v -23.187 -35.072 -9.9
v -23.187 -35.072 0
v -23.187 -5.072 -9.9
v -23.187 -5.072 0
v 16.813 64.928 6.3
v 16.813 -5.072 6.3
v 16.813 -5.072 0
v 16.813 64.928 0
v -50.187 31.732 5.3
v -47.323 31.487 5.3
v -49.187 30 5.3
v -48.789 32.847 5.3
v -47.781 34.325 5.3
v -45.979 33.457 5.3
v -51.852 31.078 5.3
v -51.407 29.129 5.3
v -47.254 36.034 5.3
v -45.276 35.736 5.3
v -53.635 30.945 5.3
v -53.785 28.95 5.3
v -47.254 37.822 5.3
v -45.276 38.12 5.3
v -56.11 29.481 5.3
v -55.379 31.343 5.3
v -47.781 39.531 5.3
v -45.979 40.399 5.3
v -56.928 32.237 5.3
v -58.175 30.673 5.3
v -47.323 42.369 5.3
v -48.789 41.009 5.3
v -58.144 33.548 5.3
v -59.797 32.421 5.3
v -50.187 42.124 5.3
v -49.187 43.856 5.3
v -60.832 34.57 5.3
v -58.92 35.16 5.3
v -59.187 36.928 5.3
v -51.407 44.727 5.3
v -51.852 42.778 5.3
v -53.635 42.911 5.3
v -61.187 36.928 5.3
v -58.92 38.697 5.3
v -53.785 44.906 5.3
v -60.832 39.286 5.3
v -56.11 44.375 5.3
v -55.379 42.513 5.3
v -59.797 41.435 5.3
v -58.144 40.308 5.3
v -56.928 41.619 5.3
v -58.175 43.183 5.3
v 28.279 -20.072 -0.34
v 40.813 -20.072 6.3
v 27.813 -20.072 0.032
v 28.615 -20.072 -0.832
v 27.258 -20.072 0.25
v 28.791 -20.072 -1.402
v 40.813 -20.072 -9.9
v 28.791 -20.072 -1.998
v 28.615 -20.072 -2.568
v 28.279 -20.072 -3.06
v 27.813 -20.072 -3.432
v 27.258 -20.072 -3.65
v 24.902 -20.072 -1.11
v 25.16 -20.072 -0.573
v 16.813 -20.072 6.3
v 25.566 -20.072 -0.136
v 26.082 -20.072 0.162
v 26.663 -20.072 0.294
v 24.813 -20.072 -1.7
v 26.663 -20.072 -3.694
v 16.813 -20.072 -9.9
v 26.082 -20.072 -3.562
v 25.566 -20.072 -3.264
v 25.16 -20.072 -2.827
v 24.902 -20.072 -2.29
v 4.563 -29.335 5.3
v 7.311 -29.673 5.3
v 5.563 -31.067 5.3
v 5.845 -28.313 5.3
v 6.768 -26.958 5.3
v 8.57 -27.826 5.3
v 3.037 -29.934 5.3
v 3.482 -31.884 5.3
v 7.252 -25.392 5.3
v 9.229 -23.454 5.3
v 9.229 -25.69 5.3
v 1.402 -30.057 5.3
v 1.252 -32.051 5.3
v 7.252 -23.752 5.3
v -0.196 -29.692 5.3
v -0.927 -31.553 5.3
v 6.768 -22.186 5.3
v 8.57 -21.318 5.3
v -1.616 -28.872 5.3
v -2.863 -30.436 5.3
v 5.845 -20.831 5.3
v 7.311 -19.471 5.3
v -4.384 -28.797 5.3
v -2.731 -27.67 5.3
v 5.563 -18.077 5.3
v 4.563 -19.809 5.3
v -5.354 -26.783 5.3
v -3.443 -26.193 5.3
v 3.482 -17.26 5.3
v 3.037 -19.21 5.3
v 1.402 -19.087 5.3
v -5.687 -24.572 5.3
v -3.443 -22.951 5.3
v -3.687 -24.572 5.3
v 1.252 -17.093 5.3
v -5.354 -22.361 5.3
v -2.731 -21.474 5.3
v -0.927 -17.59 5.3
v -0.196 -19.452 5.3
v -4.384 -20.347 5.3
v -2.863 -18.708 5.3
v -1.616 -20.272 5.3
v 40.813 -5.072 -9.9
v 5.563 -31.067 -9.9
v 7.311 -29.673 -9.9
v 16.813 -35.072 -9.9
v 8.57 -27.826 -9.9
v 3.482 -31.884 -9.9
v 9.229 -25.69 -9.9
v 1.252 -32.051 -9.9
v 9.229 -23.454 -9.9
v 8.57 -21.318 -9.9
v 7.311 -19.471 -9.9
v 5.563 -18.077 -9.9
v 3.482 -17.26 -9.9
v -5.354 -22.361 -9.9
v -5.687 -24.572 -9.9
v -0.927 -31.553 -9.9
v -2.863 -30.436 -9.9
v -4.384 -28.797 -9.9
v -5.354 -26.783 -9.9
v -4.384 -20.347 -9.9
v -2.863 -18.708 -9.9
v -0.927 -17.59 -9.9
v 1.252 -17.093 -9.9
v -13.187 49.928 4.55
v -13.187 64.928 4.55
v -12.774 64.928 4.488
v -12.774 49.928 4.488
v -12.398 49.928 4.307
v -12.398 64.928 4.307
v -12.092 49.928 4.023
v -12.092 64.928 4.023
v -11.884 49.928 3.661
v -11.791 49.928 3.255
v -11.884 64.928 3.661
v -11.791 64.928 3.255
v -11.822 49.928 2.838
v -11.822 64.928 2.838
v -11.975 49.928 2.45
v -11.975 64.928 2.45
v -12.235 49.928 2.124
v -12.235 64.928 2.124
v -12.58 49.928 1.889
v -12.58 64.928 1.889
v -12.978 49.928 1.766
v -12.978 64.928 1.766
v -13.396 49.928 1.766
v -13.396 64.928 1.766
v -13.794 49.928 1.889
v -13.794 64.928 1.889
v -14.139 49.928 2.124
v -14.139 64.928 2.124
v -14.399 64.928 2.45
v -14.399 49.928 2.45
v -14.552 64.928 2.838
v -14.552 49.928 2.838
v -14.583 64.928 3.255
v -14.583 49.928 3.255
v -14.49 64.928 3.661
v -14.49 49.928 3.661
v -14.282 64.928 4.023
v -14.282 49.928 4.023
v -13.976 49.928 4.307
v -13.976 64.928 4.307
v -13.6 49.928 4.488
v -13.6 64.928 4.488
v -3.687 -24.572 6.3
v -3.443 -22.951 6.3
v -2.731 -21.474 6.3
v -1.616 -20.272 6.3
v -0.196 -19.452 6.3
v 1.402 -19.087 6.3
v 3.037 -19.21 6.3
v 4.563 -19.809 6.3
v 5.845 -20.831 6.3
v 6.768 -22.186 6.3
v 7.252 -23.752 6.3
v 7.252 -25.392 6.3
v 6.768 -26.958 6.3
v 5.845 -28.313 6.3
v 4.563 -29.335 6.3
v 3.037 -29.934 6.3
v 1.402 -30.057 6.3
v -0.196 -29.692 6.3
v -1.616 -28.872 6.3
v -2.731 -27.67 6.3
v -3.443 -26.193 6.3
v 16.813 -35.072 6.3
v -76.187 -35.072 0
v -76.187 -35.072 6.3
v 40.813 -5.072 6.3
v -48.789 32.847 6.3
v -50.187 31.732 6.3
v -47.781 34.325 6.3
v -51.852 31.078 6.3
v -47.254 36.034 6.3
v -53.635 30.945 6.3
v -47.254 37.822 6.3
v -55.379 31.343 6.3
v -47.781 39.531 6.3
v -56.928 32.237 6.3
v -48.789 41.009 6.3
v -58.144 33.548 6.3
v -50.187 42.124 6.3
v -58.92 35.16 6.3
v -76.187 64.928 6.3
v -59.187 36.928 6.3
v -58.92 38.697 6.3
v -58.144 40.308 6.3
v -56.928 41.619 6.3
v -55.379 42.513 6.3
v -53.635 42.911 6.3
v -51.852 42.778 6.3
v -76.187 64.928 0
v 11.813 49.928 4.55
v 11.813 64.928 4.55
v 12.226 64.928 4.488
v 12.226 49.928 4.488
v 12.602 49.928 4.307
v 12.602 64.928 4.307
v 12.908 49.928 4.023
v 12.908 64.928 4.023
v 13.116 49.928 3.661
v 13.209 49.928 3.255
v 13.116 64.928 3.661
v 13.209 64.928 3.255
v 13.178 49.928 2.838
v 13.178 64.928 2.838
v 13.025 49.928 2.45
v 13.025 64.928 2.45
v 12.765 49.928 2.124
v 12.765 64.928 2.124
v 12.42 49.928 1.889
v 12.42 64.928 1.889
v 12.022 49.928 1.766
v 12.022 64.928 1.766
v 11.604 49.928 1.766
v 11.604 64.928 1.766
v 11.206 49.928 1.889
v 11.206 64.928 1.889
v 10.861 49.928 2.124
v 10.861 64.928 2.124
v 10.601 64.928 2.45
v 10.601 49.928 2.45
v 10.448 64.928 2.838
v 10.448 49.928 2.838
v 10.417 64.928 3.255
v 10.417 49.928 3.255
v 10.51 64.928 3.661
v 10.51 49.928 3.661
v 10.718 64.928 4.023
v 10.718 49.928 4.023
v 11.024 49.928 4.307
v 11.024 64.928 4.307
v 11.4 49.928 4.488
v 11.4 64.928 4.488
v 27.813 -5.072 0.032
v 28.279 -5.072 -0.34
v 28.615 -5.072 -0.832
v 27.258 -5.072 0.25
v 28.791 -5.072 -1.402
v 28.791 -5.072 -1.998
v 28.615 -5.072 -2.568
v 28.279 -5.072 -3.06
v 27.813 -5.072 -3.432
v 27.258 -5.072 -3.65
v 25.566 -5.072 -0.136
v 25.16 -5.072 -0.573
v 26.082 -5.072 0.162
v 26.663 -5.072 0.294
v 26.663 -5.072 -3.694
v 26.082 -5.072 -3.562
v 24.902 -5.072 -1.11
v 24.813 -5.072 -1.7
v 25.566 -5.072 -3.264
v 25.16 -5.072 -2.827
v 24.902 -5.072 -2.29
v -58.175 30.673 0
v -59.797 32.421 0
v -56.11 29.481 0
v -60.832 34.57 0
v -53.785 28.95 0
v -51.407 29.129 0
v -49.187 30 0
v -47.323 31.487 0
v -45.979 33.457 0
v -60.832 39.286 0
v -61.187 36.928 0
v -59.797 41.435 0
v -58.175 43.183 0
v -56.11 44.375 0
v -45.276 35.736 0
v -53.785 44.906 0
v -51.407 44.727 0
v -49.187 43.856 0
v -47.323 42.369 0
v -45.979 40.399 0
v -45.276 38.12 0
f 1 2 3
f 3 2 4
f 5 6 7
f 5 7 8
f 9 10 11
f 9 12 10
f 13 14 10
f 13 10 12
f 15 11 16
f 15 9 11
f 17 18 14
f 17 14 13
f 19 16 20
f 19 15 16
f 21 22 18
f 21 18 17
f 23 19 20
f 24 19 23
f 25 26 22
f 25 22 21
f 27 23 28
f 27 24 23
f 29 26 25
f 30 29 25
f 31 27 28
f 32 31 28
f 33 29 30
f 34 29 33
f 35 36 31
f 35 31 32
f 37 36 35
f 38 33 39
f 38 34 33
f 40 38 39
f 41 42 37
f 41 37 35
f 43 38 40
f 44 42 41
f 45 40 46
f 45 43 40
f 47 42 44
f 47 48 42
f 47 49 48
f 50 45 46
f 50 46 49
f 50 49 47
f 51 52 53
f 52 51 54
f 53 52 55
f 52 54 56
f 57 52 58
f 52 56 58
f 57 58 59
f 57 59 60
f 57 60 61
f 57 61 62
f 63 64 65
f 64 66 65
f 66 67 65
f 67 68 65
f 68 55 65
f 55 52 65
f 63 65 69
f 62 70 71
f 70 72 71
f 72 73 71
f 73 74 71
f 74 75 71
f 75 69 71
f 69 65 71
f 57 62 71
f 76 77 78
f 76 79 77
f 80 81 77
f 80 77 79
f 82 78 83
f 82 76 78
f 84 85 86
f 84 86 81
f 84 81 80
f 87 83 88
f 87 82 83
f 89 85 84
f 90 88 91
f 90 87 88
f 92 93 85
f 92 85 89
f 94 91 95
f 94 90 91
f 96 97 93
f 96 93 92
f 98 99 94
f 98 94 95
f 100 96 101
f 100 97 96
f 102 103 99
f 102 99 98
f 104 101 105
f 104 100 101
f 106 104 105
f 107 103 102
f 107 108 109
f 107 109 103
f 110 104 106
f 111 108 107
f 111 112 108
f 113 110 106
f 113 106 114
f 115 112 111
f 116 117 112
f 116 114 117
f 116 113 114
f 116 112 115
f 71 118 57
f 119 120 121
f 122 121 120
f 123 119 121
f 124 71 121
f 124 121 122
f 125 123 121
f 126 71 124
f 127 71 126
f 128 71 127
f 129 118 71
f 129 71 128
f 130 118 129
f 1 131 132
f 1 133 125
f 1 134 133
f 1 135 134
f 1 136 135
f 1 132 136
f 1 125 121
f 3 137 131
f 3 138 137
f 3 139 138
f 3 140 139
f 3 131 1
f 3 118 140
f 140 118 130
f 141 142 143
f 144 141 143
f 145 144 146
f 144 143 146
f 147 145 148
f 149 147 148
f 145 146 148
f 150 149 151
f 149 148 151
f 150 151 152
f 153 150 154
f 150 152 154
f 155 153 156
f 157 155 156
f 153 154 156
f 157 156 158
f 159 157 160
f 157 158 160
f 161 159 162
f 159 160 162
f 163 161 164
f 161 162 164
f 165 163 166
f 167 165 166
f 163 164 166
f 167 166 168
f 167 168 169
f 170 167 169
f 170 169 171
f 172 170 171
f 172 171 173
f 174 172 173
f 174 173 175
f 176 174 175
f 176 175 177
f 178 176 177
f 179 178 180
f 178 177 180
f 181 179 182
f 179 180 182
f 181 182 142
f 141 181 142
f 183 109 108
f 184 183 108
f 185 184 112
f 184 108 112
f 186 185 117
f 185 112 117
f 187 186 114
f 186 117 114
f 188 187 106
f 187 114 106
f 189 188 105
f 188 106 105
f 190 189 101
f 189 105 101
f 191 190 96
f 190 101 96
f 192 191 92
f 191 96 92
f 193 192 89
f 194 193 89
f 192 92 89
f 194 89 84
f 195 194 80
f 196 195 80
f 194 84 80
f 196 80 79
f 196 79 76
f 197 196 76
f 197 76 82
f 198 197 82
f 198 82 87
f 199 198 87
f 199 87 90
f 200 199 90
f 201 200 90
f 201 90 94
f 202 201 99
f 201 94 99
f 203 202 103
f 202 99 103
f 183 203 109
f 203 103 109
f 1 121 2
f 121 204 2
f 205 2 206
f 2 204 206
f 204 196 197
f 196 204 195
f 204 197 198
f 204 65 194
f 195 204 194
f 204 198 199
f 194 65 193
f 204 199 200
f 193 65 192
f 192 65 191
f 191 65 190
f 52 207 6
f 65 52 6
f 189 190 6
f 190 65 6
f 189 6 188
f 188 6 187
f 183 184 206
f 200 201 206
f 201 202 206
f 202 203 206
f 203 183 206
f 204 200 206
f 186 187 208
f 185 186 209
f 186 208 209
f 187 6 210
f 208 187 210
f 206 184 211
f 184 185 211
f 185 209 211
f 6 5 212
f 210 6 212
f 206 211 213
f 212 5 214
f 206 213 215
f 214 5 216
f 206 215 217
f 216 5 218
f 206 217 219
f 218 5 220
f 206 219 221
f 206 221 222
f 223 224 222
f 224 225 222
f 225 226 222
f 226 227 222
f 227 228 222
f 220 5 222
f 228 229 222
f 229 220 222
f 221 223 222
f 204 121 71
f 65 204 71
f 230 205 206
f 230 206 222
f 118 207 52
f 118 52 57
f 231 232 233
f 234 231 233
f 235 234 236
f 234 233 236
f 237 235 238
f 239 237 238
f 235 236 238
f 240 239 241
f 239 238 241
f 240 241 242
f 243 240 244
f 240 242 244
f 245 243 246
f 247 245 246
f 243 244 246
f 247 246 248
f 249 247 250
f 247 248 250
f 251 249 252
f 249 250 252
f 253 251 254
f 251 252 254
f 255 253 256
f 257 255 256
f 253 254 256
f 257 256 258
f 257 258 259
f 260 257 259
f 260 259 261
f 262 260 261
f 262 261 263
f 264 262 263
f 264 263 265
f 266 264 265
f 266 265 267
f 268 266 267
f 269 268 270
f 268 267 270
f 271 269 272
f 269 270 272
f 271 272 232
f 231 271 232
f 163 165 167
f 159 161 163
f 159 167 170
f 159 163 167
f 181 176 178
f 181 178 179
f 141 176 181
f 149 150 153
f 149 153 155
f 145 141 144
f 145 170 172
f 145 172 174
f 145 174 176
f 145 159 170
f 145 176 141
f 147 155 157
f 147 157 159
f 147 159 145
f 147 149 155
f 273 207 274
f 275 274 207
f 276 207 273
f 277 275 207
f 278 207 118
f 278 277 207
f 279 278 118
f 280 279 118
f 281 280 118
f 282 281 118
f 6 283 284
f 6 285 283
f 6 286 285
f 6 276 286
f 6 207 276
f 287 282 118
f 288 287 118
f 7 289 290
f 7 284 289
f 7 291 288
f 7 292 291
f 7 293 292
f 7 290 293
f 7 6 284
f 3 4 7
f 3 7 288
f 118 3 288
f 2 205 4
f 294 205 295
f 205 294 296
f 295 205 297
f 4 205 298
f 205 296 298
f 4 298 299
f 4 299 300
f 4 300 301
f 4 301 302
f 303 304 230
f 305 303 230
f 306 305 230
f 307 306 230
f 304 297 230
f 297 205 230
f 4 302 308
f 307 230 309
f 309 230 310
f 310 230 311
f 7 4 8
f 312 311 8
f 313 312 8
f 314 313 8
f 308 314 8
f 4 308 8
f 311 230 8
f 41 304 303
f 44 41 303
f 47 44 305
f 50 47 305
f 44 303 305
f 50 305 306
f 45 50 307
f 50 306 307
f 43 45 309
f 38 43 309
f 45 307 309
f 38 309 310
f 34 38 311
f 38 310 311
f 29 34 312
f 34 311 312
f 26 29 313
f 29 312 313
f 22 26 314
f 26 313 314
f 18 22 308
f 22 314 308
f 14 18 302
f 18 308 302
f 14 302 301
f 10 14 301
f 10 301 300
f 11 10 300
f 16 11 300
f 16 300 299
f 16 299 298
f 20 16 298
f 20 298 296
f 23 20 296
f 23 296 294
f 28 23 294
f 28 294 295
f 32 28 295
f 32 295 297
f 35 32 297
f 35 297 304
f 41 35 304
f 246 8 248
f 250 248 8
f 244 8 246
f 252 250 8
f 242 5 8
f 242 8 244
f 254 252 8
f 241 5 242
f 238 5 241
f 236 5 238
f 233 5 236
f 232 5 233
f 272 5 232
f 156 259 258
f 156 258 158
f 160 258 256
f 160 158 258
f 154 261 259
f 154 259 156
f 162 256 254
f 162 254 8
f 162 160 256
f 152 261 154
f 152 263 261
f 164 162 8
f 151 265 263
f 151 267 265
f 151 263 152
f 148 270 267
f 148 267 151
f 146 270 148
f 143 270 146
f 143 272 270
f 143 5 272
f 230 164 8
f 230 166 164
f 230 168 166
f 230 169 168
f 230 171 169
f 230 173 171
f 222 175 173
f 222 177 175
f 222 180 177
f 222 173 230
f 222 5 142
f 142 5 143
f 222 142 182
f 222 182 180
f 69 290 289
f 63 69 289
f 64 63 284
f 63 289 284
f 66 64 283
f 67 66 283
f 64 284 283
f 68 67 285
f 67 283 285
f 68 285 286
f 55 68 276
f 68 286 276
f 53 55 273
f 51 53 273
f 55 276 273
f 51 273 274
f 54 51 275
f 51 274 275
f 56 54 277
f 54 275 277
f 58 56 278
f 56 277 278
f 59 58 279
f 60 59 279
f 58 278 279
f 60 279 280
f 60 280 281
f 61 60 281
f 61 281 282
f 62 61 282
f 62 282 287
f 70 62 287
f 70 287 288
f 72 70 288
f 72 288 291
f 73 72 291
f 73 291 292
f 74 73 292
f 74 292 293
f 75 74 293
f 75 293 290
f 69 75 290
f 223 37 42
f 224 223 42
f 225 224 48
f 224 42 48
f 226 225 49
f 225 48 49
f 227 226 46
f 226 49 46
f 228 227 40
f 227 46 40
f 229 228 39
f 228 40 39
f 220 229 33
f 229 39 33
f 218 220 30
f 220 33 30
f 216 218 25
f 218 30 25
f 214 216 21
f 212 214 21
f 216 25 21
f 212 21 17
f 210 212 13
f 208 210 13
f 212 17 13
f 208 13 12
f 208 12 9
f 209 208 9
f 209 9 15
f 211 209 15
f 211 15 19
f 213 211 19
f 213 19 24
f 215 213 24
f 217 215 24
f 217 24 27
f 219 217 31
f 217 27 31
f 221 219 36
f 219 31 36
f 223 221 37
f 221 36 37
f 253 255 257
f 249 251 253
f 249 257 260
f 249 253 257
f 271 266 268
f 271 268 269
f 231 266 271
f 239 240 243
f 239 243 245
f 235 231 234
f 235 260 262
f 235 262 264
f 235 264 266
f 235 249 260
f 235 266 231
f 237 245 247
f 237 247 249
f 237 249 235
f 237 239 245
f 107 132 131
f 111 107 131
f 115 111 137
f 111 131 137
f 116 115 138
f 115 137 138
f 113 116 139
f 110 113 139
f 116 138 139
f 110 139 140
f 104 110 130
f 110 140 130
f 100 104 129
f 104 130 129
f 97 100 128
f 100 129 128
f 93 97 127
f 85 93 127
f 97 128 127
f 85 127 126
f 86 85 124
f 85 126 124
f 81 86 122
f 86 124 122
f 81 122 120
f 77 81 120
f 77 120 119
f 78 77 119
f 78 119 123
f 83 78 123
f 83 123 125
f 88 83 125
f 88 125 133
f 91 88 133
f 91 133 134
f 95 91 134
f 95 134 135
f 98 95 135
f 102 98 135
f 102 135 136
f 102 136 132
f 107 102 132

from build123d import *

# Parameters (mm, degrees)
SKETCH1_W           = 93
SKETCH1_H           = 100
BOSS_EXTRUDE2_DEPTH = 6.3
SKETCH3_W           = 40
SKETCH3_H           = 100
BOSS_EXTRUDE3_DEPTH = 9.9
SKETCH4_W           = 16.2
SKETCH4_H           = 15
BOSS_EXTRUDE4_DEPTH = 24
SKETCH5_R           = 2
CUT_EXTRUDE1_DEPTH  = 50
SKETCH6_R           = 7.5
CUT_EXTRUDE2_DEPTH  = 50
SKETCH7_R           = 8
CUT_EXTRUDE3_DEPTH  = 50
EXTRUDE_THIN1_START = -5.3
SKETCH7_2_R         = 8
SKETCH7_2_R_2       = 6
EXTRUDE_THIN1_DEPTH = 1
EXTRUDE_THIN2_START = -15.2
SKETCH6_2_R         = 7.5
SKETCH6_2_R_2       = 5.5
EXTRUDE_THIN2_DEPTH = 1
SKETCH8_R           = 1.4
CUT_EXTRUDE4_DEPTH  = 20
SKETCH9_W           = 40
SKETCH9_H           = 70
CUT_EXTRUDE5_DEPTH  = 9.9
SKETCH10_R          = 1.4
CUT_EXTRUDE6_DEPTH  = 15


with BuildPart() as part:
    # Sketch1 → Boss-Extrude2 (new body)
    with BuildSketch(Plane.XY):
        with Locations((-29.68705036, 14.928057554)):
            Rectangle(SKETCH1_W, SKETCH1_H)
    extrude(amount=BOSS_EXTRUDE2_DEPTH)

    # Sketch3 → Boss-Extrude3 (add)
    with BuildSketch(Plane(origin=(0, 0, 0), x_dir=(-1, 0, 0), z_dir=(0, 0, -1))):
        with Locations((3.18705036, 14.928057554)):
            Rectangle(SKETCH3_W, SKETCH3_H)
    extrude(amount=BOSS_EXTRUDE3_DEPTH)

    # Sketch4 → Boss-Extrude4 (add)
    with BuildSketch(Plane(origin=(16.81294964, 0, 0), x_dir=(0, 0, -1), z_dir=(1, 0, 0))):
        with Locations((1.8, -12.571942446)):
            Rectangle(SKETCH4_W, SKETCH4_H)
    extrude(amount=BOSS_EXTRUDE4_DEPTH)

    # Sketch5 → Cut-Extrude1 (cut)
    with BuildSketch(Plane(origin=(0, -5.071942446, 0), x_dir=(1, 0, 0), z_dir=(0, 1, 0))):
        with Locations(Location((26.81294964, 1.7, 0), (0, 0, 180))):
            Circle(SKETCH5_R)
    extrude(amount=-CUT_EXTRUDE1_DEPTH, mode=Mode.SUBTRACT)

    # Sketch6 → Cut-Extrude2 (cut)
    with BuildSketch(Plane(origin=(0, 0, -9.9), x_dir=(-1, 0, 0), z_dir=(0, 0, -1))):
        with Locations((-1.81294964, -24.571942446)):
            Circle(SKETCH6_R)
    extrude(amount=-CUT_EXTRUDE2_DEPTH, mode=Mode.SUBTRACT)

    # Sketch7 → Cut-Extrude3 (cut)
    with BuildSketch(Plane(origin=(0, 0, 0), x_dir=(-1, 0, 0), z_dir=(0, 0, -1))):
        with Locations((53.18705036, 36.928057554)):
            Circle(SKETCH7_R)
    extrude(amount=-CUT_EXTRUDE3_DEPTH, mode=Mode.SUBTRACT)

    # Sketch7<2> → Extrude-Thin1 (add)
    with BuildSketch(Plane(origin=(0, 0, 0), x_dir=(-1, 0, 0), z_dir=(0, 0, -1)).offset(EXTRUDE_THIN1_START)):
        with Locations((53.18705036, 36.928057554)):
            Circle(SKETCH7_2_R)
        with Locations((53.18705036, 36.928057554)):
            Circle(SKETCH7_2_R_2, mode=Mode.SUBTRACT)
    extrude(amount=-EXTRUDE_THIN1_DEPTH)

    # Sketch6<2> → Extrude-Thin2 (add)
    with BuildSketch(Plane(origin=(0, 0, -9.9), x_dir=(-1, 0, 0), z_dir=(0, 0, -1)).offset(EXTRUDE_THIN2_START)):
        with Locations((-1.81294964, -24.571942446)):
            Circle(SKETCH6_2_R)
        with Locations((-1.81294964, -24.571942446)):
            Circle(SKETCH6_2_R_2, mode=Mode.SUBTRACT)
    extrude(amount=-EXTRUDE_THIN2_DEPTH)

    # Sketch8 → Cut-Extrude4 (cut)
    with BuildSketch(Plane(origin=(0, 64.928057554, 0), x_dir=(1, 0, 0), z_dir=(0, 1, 0))):
        with Locations(Location((-15.68705036, 1.8, 0), (0, 0, 270))):
            Circle(SKETCH8_R)
        with Locations(Location((9.31294964, 1.8, 0), (0, 0, 270))):
            Circle(SKETCH8_R)
    extrude(amount=-CUT_EXTRUDE4_DEPTH, mode=Mode.SUBTRACT)

    # Sketch9 → Cut-Extrude5 (cut)
    with BuildSketch(Plane(origin=(0, 0, -9.9), x_dir=(-1, 0, 0), z_dir=(0, 0, -1))):
        with Locations((3.18705036, 29.928057554)):
            Rectangle(SKETCH9_W, SKETCH9_H)
    extrude(amount=-CUT_EXTRUDE5_DEPTH, mode=Mode.SUBTRACT)

    # Sketch10 → Cut-Extrude6 (cut)
    with BuildSketch(Plane(origin=(0, 64.928057554, 0), x_dir=(1, 0, 0), z_dir=(0, 1, 0))):
        with Locations(Location((11.81294964, -3.15, 0), (0, 0, 270))):
            Circle(SKETCH10_R)
        with Locations(Location((-13.18705036, -3.15, 0), (0, 0, 270))):
            Circle(SKETCH10_R)
    extrude(amount=-CUT_EXTRUDE6_DEPTH, mode=Mode.SUBTRACT)


solid = part.part
